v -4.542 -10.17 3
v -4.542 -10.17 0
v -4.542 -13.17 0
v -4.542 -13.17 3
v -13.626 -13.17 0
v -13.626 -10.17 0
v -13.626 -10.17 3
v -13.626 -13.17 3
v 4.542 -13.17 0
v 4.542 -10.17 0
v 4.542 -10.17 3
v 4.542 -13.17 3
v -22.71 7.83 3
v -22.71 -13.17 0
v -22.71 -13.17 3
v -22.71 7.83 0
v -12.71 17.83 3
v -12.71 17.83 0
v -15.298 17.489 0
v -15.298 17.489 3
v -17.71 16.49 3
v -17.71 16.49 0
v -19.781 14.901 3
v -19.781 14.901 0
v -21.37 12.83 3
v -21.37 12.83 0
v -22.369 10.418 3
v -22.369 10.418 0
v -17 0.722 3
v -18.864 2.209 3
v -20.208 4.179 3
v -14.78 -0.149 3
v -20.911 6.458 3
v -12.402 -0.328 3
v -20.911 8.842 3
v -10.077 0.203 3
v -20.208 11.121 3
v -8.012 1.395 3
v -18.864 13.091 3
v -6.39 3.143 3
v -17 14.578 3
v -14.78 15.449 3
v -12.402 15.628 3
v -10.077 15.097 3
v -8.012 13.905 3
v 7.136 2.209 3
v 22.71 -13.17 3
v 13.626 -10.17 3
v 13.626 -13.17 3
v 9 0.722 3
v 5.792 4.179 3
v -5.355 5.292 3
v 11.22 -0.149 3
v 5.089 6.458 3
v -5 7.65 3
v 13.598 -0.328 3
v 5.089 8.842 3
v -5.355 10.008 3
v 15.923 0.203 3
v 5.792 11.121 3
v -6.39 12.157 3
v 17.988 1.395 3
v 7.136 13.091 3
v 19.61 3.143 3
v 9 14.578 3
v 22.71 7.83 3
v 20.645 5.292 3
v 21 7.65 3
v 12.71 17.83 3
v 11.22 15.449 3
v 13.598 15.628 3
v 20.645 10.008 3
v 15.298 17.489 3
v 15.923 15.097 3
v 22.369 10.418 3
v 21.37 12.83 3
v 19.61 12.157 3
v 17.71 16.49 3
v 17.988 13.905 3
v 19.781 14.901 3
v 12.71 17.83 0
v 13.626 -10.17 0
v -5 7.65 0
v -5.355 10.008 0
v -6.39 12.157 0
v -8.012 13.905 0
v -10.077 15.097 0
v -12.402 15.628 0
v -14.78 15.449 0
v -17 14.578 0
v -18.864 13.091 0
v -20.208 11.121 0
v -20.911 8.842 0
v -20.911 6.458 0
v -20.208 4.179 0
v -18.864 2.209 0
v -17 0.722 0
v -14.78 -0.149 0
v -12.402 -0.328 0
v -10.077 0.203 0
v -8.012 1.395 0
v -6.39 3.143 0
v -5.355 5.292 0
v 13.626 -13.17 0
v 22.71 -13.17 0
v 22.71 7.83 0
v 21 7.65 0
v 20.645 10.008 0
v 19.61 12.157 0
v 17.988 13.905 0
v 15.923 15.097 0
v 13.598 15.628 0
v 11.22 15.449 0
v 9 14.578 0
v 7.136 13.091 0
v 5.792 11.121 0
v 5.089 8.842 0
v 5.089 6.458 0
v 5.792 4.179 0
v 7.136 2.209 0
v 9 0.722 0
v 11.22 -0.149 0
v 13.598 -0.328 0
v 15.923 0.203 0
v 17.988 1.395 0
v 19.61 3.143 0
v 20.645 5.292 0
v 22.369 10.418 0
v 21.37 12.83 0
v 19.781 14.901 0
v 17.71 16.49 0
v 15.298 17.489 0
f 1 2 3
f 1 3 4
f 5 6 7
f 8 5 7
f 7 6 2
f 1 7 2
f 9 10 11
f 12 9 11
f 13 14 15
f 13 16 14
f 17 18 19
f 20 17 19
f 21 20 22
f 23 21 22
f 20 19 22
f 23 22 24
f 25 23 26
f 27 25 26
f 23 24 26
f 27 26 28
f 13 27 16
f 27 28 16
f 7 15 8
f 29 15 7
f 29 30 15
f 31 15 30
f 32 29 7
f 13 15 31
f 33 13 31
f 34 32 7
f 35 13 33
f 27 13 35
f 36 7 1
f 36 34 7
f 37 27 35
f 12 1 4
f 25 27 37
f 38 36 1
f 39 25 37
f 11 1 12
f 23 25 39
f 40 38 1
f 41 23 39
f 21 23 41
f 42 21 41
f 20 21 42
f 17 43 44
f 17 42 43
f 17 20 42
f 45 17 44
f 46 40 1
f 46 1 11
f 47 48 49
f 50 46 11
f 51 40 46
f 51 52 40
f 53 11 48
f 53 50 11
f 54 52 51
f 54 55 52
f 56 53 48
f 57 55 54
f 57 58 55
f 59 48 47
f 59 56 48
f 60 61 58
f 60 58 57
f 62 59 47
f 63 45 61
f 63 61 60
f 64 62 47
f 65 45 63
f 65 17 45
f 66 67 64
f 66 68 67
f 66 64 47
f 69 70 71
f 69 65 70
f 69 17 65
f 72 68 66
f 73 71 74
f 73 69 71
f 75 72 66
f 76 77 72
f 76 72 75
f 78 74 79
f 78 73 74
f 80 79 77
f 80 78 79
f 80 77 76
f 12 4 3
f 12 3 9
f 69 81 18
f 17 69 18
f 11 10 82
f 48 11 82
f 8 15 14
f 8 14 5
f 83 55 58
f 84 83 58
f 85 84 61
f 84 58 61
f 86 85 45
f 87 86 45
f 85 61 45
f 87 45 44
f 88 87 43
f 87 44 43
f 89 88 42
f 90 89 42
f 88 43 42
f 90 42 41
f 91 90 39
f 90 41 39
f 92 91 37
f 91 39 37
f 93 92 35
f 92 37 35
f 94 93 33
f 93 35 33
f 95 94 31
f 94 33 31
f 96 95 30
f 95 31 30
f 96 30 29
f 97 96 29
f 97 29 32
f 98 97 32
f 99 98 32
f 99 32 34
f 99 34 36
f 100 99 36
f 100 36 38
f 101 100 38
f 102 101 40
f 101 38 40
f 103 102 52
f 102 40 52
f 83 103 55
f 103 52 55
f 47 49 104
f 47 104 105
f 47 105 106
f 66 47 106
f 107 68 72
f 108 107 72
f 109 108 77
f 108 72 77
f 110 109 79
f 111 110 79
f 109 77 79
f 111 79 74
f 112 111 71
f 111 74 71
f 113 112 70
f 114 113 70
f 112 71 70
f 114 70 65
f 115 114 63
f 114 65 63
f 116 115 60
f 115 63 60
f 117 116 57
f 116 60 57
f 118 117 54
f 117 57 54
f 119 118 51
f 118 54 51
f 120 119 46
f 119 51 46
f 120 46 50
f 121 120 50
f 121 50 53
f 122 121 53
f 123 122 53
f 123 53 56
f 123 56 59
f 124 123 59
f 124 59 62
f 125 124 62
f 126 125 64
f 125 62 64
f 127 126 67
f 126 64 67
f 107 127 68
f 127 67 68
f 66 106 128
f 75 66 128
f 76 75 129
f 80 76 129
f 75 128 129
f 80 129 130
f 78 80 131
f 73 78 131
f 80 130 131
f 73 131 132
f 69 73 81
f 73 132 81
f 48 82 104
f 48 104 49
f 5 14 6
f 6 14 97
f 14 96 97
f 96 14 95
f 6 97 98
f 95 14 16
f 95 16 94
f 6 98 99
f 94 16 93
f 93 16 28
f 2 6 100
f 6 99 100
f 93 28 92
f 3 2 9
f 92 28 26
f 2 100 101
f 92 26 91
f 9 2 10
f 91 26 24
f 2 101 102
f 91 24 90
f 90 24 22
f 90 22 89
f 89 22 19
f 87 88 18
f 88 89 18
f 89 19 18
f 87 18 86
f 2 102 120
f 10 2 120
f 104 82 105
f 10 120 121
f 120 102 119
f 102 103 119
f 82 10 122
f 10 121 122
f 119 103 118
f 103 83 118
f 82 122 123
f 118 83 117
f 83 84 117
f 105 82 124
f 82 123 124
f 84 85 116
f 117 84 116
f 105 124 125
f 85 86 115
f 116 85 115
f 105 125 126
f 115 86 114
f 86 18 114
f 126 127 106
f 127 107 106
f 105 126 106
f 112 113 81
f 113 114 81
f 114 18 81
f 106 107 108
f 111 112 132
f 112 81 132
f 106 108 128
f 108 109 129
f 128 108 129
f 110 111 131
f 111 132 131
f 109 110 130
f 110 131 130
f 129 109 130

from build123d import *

# Parameters (mm, degrees)
SALIENTE_EXTRUIR1_DEPTH = 3
CROQUIS3_R              = 8
CORTAR_EXTRUIR2_DEPTH   = 3
CROQUIS5_W              = 9.084
CROQUIS5_H              = 3
SALIENTE_EXTRUIR2_DEPTH = 3


with BuildPart() as part:
    # Croquis1 → Saliente-Extruir1 (new body)
    with BuildSketch(Plane.XY):
        with BuildLine():
            Line((-22.71, -10.17), (22.71, -10.17))
            Line((22.71, -10.17), (22.71, 7.83))
            ThreePointArc((22.71, 7.83), (19.781067812, 14.901067812), (12.71, 17.83))
            Line((12.71, 17.83), (-12.71, 17.83))
            ThreePointArc((-12.71, 17.83), (-19.781067812, 14.901067812), (-22.71, 7.83))
            Line((-22.71, 7.83), (-22.71, -10.17))
        make_face()
    extrude(amount=SALIENTE_EXTRUIR1_DEPTH)

    # Croquis3 → Cortar-Extruir2 (cut)
    with BuildSketch(Plane.XY.offset(3)):
        with Locations((-13, 7.65)):
            Circle(CROQUIS3_R)
        with Locations((13, 7.65)):
            Circle(CROQUIS3_R)
    extrude(amount=-CORTAR_EXTRUIR2_DEPTH, mode=Mode.SUBTRACT)

    # Croquis5 → Saliente-Extruir2 (add)
    with BuildSketch(Plane.XZ.offset(10.17)):
        with Locations((-18.168, 1.5)):
            Rectangle(CROQUIS5_W, CROQUIS5_H)
        with Locations((0, 1.5)):
            Rectangle(CROQUIS5_W, CROQUIS5_H)
        with Locations((18.168, 1.5)):
            Rectangle(CROQUIS5_W, CROQUIS5_H)
    extrude(amount=SALIENTE_EXTRUIR2_DEPTH)


solid = part.part
